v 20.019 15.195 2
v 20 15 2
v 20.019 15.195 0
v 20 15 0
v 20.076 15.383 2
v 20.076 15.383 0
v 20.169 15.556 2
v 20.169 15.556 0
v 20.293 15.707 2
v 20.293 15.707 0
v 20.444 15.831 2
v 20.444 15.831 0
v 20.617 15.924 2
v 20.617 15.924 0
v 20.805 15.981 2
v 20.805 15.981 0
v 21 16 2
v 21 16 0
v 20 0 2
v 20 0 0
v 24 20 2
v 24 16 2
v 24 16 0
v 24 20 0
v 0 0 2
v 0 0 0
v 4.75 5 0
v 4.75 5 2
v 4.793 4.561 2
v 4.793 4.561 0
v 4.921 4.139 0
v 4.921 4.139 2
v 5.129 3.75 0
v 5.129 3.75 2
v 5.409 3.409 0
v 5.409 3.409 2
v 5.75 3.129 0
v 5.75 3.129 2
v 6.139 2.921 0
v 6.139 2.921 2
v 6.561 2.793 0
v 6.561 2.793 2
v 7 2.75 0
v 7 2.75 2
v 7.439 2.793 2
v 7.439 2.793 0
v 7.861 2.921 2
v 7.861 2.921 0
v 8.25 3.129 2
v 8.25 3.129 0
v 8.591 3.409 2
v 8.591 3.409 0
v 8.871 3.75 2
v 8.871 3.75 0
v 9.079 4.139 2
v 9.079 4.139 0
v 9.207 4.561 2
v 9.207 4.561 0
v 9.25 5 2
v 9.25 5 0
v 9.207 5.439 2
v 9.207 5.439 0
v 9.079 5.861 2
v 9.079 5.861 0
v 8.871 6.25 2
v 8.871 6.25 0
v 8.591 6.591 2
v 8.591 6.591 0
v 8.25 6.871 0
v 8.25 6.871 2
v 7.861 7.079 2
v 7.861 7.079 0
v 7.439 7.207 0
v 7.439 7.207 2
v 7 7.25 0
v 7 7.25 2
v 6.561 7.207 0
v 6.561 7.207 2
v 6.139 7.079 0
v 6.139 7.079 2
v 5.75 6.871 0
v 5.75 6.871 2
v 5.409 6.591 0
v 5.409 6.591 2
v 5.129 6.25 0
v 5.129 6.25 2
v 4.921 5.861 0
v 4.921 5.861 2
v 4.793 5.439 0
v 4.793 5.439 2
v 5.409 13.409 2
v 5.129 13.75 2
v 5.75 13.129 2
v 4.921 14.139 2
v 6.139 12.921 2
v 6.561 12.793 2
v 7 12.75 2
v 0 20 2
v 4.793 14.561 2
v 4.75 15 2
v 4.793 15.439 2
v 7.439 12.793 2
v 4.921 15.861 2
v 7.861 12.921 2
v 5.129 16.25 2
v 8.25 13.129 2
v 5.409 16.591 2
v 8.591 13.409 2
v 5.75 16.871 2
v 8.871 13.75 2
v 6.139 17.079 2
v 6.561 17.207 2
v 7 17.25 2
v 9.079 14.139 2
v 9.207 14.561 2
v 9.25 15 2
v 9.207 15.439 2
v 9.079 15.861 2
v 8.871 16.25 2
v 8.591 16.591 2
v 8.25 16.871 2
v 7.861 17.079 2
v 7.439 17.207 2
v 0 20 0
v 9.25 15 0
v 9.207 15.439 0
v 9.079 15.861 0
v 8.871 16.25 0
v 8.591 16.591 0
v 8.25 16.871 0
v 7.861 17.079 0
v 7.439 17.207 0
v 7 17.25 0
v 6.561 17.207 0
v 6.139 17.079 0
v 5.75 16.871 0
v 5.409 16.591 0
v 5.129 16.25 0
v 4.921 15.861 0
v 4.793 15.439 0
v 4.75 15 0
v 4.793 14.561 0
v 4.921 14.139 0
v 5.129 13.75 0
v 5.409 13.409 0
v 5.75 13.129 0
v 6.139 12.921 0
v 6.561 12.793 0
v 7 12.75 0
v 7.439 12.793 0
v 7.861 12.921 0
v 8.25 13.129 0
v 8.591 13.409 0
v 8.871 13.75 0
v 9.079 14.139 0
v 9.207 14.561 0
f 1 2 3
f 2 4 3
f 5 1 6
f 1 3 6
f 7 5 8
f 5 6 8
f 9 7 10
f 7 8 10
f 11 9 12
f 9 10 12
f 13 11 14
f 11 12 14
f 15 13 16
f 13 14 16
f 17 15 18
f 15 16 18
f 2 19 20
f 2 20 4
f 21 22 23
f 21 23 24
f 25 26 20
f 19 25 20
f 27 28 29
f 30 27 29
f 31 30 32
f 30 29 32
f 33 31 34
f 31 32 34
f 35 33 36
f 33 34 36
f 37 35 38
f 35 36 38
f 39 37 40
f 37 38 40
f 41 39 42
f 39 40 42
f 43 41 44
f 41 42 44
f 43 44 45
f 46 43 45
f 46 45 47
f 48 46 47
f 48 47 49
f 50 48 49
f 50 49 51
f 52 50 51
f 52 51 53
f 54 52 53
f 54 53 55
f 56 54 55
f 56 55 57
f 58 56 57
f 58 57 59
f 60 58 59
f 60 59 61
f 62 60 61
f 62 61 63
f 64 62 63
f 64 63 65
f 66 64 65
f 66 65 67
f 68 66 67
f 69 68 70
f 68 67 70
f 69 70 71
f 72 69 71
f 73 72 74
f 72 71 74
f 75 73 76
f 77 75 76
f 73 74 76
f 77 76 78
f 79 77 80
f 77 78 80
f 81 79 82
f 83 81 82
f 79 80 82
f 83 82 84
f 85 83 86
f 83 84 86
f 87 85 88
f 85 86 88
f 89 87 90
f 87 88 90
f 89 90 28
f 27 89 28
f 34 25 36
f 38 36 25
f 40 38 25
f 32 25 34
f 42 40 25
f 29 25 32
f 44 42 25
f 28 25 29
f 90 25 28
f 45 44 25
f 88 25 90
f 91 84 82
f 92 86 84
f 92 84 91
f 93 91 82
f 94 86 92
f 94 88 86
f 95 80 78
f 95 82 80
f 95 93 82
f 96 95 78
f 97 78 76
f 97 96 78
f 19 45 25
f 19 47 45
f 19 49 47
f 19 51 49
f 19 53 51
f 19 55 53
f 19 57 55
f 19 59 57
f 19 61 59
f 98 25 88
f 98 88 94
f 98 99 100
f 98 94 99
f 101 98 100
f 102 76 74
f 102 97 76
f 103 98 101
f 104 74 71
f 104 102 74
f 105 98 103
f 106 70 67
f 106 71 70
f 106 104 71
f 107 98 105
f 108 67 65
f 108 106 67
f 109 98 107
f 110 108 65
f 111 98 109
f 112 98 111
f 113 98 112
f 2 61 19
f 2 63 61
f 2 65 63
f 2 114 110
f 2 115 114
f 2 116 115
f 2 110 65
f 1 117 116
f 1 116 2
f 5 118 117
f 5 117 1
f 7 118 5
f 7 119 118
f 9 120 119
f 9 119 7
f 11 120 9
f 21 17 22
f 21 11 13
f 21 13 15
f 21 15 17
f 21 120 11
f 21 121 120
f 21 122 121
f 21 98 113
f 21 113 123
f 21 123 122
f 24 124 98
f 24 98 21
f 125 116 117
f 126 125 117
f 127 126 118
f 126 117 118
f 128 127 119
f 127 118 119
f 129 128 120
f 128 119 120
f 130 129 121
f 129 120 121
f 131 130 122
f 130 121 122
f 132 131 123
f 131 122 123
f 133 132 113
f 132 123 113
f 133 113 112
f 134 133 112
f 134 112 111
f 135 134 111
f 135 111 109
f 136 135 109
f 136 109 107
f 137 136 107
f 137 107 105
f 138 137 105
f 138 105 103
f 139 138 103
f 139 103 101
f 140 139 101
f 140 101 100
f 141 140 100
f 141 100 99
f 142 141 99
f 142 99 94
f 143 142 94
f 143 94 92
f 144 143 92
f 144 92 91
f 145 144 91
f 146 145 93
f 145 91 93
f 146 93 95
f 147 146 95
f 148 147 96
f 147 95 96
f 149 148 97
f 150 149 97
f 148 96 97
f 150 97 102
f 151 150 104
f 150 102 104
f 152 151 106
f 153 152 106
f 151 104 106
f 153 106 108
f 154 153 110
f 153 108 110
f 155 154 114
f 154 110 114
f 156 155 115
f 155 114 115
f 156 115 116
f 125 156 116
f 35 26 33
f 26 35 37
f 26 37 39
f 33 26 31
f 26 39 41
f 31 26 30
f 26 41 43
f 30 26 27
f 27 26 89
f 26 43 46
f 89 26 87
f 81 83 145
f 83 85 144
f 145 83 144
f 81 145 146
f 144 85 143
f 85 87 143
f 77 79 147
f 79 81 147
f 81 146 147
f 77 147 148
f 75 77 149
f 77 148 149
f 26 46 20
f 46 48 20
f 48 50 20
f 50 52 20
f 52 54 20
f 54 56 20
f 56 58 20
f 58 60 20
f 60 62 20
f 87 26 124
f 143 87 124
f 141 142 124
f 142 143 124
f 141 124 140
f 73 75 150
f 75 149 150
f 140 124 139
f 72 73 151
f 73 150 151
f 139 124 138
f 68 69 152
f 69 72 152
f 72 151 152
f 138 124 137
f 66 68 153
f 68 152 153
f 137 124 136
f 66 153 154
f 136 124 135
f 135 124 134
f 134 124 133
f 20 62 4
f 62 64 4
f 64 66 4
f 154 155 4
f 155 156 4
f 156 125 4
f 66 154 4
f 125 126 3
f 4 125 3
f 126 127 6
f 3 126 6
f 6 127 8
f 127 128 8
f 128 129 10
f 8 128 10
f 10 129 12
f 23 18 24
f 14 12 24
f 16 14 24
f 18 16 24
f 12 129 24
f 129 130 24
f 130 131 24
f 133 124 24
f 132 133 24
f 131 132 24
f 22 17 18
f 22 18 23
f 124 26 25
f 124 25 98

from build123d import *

# Parameters (mm, degrees)
SKETCH_1_W          = 60
SKETCH_1_H          = 20
EXTRUDE_1_DEPTH     = 2
SKETCH_2_W          = 20
SKETCH_2_H          = 16
CUT_EXTRUDE_1_DEPTH = 64.277168078
FILLET_1_R          = 1
SKETCH_3_R          = 2.25
CUT_EXTRUDE_2_DEPTH = 64.277168078
SKETCH_4_W          = 36
SKETCH_4_H          = 20
CUT_EXTRUDE_3_DEPTH = 10


with BuildPart() as part:
    # 草图1 → 凸台-拉伸1 (new body)
    with BuildSketch(Plane.XY):
        with Locations((30, 10)):
            Rectangle(SKETCH_1_W, SKETCH_1_H)
    extrude(amount=EXTRUDE_1_DEPTH)

    # 草图2 → 切除-拉伸1 (cut, through all)
    with BuildSketch(Plane.XY.offset(2)):
        with Locations((30, 8)):
            Rectangle(SKETCH_2_W, SKETCH_2_H)
    extrude(amount=-CUT_EXTRUDE_1_DEPTH, mode=Mode.SUBTRACT)

    # 圆角1
    fillet_1_edges = [part.edges().sort_by_distance(p)[0] for p in [
        (20, 16, 1),
        (40, 16, 1),
    ]]
    fillet(fillet_1_edges, radius=FILLET_1_R)

    # 草图3 → 切除-拉伸2 (cut, through all)
    with BuildSketch(Plane.XY.offset(2)):
        with Locations((7, 15)):
            Circle(SKETCH_3_R)
        with Locations(Location((53, 15, 0), (0, 0, 180))):
            Circle(SKETCH_3_R)
        with Locations((53, 5)):
            Circle(SKETCH_3_R)
        with Locations(Location((7, 5, 0), (0, 0, 180))):
            Circle(SKETCH_3_R)
    extrude(amount=-CUT_EXTRUDE_2_DEPTH, mode=Mode.SUBTRACT)

    # 草图4 → 切除-拉伸3 (cut)
    with BuildSketch(Plane.XY.offset(2)):
        with Locations((42, 10)):
            Rectangle(SKETCH_4_W, SKETCH_4_H)
    extrude(amount=-CUT_EXTRUDE_3_DEPTH, mode=Mode.SUBTRACT)


solid = part.part
